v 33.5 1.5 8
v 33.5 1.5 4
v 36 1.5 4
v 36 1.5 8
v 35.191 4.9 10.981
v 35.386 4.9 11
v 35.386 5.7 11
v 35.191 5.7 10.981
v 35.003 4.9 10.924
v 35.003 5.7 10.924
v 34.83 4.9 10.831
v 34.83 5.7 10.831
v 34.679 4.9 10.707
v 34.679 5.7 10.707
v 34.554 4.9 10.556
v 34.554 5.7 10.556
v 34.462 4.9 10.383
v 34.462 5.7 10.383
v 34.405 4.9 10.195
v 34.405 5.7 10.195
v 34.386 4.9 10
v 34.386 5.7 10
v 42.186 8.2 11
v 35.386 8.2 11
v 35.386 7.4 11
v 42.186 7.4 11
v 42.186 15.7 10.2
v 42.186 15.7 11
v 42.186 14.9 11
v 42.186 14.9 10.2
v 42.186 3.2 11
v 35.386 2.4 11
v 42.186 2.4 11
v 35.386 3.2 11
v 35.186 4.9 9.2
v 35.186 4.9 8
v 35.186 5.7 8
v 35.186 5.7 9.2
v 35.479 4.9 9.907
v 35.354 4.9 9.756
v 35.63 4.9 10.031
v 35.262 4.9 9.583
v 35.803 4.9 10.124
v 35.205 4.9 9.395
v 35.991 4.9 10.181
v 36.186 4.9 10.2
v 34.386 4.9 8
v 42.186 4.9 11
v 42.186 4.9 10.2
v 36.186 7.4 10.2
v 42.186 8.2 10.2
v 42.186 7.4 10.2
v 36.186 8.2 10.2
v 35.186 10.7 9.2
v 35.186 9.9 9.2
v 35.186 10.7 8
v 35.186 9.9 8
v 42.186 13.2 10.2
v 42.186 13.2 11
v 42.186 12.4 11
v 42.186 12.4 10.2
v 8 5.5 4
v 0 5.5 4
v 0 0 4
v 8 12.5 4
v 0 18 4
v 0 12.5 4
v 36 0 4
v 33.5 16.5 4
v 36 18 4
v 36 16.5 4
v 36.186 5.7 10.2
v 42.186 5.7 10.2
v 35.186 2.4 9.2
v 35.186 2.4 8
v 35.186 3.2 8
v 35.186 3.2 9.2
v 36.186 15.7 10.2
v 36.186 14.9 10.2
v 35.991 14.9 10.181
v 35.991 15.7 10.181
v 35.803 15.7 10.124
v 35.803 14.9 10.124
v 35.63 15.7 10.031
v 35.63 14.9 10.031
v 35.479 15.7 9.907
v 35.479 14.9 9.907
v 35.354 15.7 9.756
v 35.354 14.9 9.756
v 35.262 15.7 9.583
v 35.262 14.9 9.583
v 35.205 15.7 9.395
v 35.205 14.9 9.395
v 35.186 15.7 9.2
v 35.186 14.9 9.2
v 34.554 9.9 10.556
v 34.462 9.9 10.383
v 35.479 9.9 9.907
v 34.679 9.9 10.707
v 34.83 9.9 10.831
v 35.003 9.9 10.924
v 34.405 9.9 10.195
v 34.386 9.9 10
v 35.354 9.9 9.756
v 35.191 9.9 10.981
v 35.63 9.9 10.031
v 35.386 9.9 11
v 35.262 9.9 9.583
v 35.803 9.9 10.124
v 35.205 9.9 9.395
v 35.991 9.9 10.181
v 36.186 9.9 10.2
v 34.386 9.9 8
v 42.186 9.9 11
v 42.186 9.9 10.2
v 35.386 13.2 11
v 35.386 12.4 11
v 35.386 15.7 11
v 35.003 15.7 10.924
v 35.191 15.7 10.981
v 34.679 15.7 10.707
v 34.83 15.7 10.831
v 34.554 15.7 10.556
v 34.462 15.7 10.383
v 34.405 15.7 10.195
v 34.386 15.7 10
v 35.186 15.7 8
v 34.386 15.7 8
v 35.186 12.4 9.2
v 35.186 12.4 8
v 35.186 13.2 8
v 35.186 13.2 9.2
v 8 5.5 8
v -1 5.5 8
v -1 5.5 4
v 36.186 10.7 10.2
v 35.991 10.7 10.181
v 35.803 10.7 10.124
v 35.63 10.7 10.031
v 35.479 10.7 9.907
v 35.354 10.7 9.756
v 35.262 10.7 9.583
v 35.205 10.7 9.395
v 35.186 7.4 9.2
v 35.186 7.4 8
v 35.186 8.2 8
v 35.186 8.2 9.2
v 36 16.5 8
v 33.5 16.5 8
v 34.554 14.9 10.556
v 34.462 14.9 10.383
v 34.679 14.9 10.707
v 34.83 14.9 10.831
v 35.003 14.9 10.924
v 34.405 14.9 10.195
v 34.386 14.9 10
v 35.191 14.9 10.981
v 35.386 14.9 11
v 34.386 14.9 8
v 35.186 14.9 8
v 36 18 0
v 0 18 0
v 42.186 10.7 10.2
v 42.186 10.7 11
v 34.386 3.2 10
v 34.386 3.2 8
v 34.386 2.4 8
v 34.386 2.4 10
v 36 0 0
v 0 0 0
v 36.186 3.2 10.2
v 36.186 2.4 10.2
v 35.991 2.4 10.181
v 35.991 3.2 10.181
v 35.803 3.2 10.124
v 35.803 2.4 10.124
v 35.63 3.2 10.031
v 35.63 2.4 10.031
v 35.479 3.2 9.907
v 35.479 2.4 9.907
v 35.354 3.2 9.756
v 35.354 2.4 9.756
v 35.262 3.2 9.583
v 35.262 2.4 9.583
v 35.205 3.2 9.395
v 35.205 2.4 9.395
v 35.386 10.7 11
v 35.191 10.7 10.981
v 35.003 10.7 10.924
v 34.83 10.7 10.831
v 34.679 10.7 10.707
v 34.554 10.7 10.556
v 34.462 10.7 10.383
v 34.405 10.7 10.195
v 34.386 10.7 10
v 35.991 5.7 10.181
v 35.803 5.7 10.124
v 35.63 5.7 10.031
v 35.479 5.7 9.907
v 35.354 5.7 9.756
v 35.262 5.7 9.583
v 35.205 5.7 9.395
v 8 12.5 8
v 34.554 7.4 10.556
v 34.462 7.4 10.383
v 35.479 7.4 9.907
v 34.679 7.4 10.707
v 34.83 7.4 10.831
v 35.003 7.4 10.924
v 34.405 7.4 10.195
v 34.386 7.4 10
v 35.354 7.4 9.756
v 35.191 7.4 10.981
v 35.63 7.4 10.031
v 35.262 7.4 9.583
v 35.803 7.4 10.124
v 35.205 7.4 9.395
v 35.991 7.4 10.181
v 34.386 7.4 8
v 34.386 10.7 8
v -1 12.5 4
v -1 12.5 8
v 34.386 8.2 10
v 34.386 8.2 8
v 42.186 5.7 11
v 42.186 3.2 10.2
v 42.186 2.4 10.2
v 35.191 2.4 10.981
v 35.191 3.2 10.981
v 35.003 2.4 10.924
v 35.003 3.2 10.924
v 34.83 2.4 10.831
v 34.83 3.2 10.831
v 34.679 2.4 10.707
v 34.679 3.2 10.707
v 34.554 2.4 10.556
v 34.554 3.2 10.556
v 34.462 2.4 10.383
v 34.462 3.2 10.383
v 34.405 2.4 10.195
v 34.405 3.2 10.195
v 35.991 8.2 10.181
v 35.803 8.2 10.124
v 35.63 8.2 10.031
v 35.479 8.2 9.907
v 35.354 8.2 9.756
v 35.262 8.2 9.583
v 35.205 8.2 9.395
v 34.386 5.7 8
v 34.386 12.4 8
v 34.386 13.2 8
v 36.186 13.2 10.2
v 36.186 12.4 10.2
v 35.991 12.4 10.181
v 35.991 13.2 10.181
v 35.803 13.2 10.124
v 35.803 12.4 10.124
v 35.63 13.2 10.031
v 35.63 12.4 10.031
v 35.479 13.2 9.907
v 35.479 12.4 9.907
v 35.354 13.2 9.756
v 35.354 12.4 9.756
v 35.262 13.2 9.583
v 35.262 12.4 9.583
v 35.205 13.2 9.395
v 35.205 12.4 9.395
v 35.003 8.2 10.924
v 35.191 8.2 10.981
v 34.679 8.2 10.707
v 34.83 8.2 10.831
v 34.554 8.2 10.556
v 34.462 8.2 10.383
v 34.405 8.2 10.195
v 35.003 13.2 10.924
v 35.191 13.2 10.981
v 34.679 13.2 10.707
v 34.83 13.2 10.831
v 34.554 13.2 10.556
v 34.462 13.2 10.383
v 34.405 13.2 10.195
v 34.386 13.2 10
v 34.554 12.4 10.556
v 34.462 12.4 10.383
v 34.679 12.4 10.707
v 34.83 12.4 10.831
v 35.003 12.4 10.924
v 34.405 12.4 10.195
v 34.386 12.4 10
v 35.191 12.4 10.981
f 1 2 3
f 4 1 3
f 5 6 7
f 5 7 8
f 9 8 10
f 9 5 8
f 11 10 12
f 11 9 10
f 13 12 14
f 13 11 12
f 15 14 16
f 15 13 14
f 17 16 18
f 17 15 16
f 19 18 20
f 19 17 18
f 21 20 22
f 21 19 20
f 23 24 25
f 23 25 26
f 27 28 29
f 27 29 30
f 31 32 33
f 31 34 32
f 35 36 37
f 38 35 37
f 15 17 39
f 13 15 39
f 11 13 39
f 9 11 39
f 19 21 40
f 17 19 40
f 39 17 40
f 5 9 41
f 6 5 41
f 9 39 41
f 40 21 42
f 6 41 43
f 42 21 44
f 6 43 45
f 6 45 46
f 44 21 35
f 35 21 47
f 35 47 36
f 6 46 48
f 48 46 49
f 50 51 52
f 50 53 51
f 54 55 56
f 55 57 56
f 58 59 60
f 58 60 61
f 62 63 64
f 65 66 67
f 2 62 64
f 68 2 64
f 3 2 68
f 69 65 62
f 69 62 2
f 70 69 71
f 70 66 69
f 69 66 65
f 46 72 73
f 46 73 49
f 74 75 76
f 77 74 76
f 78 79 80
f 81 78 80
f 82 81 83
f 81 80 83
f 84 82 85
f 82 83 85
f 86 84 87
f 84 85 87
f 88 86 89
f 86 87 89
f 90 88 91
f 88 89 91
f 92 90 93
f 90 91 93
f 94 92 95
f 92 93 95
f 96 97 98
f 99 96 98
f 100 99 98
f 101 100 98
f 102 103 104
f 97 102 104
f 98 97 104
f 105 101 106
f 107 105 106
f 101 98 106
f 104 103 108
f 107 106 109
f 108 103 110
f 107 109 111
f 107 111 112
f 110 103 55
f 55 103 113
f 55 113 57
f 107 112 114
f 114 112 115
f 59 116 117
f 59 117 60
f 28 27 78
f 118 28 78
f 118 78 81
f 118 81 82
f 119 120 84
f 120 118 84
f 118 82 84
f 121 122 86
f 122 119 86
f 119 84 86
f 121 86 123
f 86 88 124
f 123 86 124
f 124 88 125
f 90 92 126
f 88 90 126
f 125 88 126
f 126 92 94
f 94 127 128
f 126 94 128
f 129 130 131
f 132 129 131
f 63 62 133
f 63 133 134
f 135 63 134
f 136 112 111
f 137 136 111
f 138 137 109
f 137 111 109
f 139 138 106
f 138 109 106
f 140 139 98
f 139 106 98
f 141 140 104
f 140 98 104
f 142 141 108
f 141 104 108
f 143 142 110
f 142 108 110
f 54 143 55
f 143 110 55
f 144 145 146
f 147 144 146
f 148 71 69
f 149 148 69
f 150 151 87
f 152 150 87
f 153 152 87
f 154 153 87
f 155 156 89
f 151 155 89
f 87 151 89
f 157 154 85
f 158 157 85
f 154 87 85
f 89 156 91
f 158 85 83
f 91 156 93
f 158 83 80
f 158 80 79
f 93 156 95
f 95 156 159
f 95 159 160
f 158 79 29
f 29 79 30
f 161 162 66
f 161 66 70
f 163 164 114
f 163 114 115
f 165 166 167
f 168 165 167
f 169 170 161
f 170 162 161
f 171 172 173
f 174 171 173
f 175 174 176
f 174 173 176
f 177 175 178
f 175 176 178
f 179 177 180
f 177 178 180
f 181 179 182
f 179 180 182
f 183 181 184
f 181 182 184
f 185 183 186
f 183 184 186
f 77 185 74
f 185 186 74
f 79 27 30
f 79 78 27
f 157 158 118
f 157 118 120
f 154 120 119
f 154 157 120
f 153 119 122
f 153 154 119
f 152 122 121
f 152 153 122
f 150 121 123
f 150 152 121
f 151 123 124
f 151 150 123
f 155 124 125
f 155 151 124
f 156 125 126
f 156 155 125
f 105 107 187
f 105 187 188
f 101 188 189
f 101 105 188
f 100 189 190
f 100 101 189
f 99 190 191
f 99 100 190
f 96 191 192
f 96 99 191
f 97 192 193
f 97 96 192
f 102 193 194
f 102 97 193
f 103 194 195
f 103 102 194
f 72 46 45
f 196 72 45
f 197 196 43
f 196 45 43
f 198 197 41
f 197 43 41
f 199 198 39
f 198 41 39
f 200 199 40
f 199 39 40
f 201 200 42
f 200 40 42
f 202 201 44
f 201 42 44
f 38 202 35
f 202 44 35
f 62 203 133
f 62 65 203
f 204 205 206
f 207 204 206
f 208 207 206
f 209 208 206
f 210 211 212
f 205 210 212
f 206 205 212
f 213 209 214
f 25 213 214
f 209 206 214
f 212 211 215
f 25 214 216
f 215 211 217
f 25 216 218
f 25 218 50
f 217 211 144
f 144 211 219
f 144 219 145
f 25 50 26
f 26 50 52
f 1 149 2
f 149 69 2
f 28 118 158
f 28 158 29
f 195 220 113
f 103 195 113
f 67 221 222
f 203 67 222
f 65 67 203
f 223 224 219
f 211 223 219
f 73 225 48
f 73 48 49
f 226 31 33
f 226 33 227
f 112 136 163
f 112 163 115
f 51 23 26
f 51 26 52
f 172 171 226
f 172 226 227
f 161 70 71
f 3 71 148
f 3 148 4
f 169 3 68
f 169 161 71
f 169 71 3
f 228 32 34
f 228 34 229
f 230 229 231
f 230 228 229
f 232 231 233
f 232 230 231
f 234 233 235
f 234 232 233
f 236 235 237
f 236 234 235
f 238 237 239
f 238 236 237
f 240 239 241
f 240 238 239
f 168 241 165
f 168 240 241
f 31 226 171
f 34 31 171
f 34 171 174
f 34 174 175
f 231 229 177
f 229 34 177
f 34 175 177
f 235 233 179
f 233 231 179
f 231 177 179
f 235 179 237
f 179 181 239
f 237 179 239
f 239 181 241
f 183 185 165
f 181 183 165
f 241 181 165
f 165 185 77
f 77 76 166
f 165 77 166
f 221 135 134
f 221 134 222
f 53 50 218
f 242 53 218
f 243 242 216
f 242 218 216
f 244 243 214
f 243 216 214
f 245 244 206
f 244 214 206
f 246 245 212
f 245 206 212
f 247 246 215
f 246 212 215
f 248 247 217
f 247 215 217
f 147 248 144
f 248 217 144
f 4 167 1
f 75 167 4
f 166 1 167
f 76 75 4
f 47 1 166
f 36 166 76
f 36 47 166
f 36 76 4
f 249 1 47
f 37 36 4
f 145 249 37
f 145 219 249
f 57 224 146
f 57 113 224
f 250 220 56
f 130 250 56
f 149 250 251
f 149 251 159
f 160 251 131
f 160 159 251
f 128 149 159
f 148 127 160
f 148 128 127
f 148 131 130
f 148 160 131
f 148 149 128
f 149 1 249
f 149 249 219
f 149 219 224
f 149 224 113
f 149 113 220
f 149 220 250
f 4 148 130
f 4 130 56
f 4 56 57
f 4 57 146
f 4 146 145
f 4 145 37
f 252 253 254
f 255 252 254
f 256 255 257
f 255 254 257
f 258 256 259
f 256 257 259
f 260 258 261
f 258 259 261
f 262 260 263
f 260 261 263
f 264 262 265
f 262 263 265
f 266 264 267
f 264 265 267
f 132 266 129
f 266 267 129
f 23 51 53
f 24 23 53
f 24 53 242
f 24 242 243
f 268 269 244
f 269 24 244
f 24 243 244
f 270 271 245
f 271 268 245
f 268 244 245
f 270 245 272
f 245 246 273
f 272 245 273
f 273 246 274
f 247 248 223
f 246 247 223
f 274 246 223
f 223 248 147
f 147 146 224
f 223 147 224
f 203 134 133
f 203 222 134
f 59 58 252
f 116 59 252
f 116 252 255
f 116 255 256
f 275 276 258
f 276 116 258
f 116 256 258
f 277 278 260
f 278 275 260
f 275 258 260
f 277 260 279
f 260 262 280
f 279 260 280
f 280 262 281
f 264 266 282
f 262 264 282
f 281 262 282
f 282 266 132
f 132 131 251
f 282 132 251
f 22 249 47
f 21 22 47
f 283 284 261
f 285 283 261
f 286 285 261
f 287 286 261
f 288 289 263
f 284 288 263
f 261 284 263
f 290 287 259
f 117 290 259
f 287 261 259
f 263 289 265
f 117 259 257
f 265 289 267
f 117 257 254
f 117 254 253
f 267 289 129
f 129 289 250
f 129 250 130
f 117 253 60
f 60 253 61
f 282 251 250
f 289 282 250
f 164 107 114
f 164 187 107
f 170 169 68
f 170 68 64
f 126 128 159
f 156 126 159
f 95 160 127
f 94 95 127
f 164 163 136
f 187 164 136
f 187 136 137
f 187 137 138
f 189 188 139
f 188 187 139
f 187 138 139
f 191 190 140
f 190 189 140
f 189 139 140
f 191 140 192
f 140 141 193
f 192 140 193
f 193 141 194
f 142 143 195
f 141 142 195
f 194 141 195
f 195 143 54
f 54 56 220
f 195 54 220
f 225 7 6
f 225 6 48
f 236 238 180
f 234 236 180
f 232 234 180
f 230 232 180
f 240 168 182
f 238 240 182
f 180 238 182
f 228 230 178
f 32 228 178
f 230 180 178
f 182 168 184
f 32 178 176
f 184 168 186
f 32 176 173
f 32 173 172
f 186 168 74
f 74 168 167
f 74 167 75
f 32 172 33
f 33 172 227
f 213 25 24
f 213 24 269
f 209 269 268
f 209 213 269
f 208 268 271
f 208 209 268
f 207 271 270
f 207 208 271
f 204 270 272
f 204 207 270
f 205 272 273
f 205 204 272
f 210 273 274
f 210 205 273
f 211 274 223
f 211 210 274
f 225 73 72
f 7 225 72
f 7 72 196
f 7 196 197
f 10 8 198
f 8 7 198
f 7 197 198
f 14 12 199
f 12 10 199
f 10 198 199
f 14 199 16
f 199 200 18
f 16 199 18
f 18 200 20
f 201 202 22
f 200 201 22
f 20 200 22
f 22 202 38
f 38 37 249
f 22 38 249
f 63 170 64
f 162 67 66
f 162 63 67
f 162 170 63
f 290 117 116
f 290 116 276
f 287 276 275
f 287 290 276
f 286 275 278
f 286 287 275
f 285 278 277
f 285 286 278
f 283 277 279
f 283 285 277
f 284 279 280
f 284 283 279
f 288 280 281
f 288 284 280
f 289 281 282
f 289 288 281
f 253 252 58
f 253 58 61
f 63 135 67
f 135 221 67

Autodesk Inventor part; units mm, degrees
ref_plane "YZ Plane" through (0, 0, 0) normal (1, 0, 0) x (0, 1, 0)
ref_plane "XZ Plane" through (0, 0, 0) normal (0, 1, 0) x (-1, 0, 0)
ref_plane "XY Plane" through (0, 0, 0) normal (0, 0, 1) x (1, 0, 0)
sketch "Esquisse1" plane through (0, 0, 0) normal (0, 0, 1) x (1, 0, 0)
  line L0 (0, 18) -> (36, 18)
  line L1 (36, 18) -> (36, 0)
  line L2 (36, 0) -> (0, 0)
  line L3 (0, 0) -> (0, 18)
  line L4 (-7.2, 0) -> (43.2, 0) projected
  line L5 (0, -3.6) -> (0, 21.6) projected
  point P0 (0, 0)
  dimension "d0" = 18
  dimension "d1" = 36
extrude "Extrusion1" add sketch "Esquisse1" along normal blind 4
sketch "Esquisse2" plane through (0, 0, 4) normal (0, 0, 1) x (1, 0, 0)
  line L0 (-1, 12.5) -> (8, 12.5)
  line L1 (8, 12.5) -> (8, 5.5)
  line L2 (8, 5.5) -> (-1, 5.5)
  line L3 (-1, 5.5) -> (-1, 12.5)
  line L4 (0, 0) -> (36, 0) projected
  line L5 (0, 18) -> (0, 0) projected
  dimension "d4" = 7
  dimension "d5" = 9
  dimension "d6" = 5.5
  dimension "d7" = 1
extrude "Extrusion2" add sketch "Esquisse2" along normal blind 4
sketch "Esquisse3" plane through (0, 0, 4) normal (0, 0, 1) x (1, 0, 0)
  line L0 (33.5, 1.5) -> (36, 1.5)
  line L1 (36, 1.5) -> (36, 4)
  line L2 (36, 4) -> (33.5, 4)
  line L3 (33.5, 4) -> (33.5, 1.5)
  line L4 (36, 0) -> (36, 18) projected
  line L5 (33.5, 6.5) -> (33.5, 4)
  line L6 (36, 6.5) -> (33.5, 6.5)
  line L7 (36, 4) -> (36, 6.5)
  line L8 (33.5, 4) -> (36, 4)
  line L9 (33.5, 9) -> (33.5, 6.5)
  line L10 (36, 9) -> (33.5, 9)
  line L11 (36, 6.5) -> (36, 9)
  line L12 (33.5, 6.5) -> (36, 6.5)
  line L13 (33.5, 11.5) -> (33.5, 9)
  line L14 (36, 11.5) -> (33.5, 11.5)
  line L15 (36, 9) -> (36, 11.5)
  line L16 (33.5, 9) -> (36, 9)
  line L17 (33.5, 14) -> (33.5, 11.5)
  line L18 (36, 14) -> (33.5, 14)
  line L19 (36, 11.5) -> (36, 14)
  line L20 (33.5, 11.5) -> (36, 11.5)
  line L21 (33.5, 16.5) -> (33.5, 14)
  line L22 (36, 16.5) -> (33.5, 16.5)
  line L23 (36, 14) -> (36, 16.5)
  line L24 (33.5, 14) -> (36, 14)
  line L25 (0, 0) -> (36, 0) projected
  dimension "d10" = 2.5
  dimension "d11" = 2.5
  dimension "d14" = 2.5
  dimension "d19" = 1.5
extrude "Extrusion3" add sketch "Esquisse3" along normal blind 4
sketch "Esquisse4" plane through (0, 0, 8) normal (0, 0, 1) x (1, 0, 0)
  line L0 (34.3859, 2.4) -> (35.1859, 2.4)
  line L1 (35.1859, 2.4) -> (35.1859, 3.2)
  line L2 (35.1859, 3.2) -> (34.3859, 3.2)
  line L3 (34.3859, 3.2) -> (34.3859, 2.4)
  line L4 (33.5, 16.5) -> (33.5, 1.5) projected
  line L5 (34.3859, 5.7) -> (34.3859, 4.9)
  line L6 (34.3859, 4.9) -> (35.1859, 4.9)
  line L7 (35.1859, 4.9) -> (35.1859, 5.7)
  line L8 (35.1859, 5.7) -> (34.3859, 5.7)
  line L9 (34.3859, 8.2) -> (34.3859, 7.4)
  line L10 (34.3859, 7.4) -> (35.1859, 7.4)
  line L11 (35.1859, 7.4) -> (35.1859, 8.2)
  line L12 (35.1859, 8.2) -> (34.3859, 8.2)
  line L13 (34.3859, 10.7) -> (34.3859, 9.9)
  line L14 (34.3859, 9.9) -> (35.1859, 9.9)
  line L15 (35.1859, 9.9) -> (35.1859, 10.7)
  line L16 (35.1859, 10.7) -> (34.3859, 10.7)
  line L17 (34.3859, 13.2) -> (34.3859, 12.4)
  line L18 (34.3859, 12.4) -> (35.1859, 12.4)
  line L19 (35.1859, 12.4) -> (35.1859, 13.2)
  line L20 (35.1859, 13.2) -> (34.3859, 13.2)
  line L21 (34.3859, 15.7) -> (34.3859, 14.9)
  line L22 (34.3859, 14.9) -> (35.1859, 14.9)
  line L23 (35.1859, 14.9) -> (35.1859, 15.7)
  line L24 (35.1859, 15.7) -> (34.3859, 15.7)
  line L25 (33.5, 1.5) -> (36, 1.5) projected
  point P0 (0, 0)
  dimension "d22" = 0.8
  dimension "d23" = 0.8
  dimension "d26" = 2.5
  dimension "d31" = 0.9
extrude "Extrusion4" add sketch "Esquisse4" along normal blind 3
sketch "Esquisse5" plane through (35.1859, 14.9, 8) normal (1, 0, 0) x (0, 0, -1)
  line L0 (-3, 0) -> (-3, 0.8) projected
  line L1 (-3, 0.8) -> (-2.2, 0.8)
  line L2 (-2.2, 0.8) -> (-2.2, 0)
  line L3 (-2.2, 0) -> (-3, 0)
  line L4 (-3, 0) -> (-3, 0.8)
  line L5 (0, 0) -> (-3, 0) projected
  line L6 (0, -13.4) -> (0, 1.6) projected
  line L7 (-2.2, -1.7) -> (-2.2, -2.5)
  line L8 (-3, -1.7) -> (-2.2, -1.7)
  line L9 (-3, -2.5) -> (-3, -1.7)
  line L10 (-2.2, -2.5) -> (-3, -2.5)
  line L11 (-2.2, -4.2) -> (-2.2, -5)
  line L12 (-3, -4.2) -> (-2.2, -4.2)
  line L13 (-3, -5) -> (-3, -4.2)
  line L14 (-2.2, -5) -> (-3, -5)
  line L15 (-2.2, -6.7) -> (-2.2, -7.5)
  line L16 (-3, -6.7) -> (-2.2, -6.7)
  line L17 (-3, -7.5) -> (-3, -6.7)
  line L18 (-2.2, -7.5) -> (-3, -7.5)
  line L19 (-2.2, -9.2) -> (-2.2, -10)
  line L20 (-3, -9.2) -> (-2.2, -9.2)
  line L21 (-3, -10) -> (-3, -9.2)
  line L22 (-2.2, -10) -> (-3, -10)
  line L23 (-2.2, -11.7) -> (-2.2, -12.5)
  line L24 (-3, -11.7) -> (-2.2, -11.7)
  line L25 (-3, -12.5) -> (-3, -11.7)
  line L26 (-2.2, -12.5) -> (-3, -12.5)
  point P0 (8, -14.9)
  dimension "d34" = 0.8
  dimension "d37" = 2.5
extrude "Extrusion5" add sketch "Esquisse5" along normal blind 7
fillet "Congé1" radius 1 12 edges at (34.3859, 15.3, 11) (34.3859, 12.8, 11) (34.3859, 10.3, 11) (34.3859, 7.8, 11) (34.3859, 5.3, 11) (34.3859, 2.8, 11) (35.1859, 2.8, 10.2) (35.1859, 5.3, 10.2) (35.1859, 7.8, 10.2) (35.1859, 10.3, 10.2) (35.1859, 12.8, 10.2) (35.1859, 15.3, 10.2)
equation "\"d23\" = d22"
properties part number "convertisseur"
